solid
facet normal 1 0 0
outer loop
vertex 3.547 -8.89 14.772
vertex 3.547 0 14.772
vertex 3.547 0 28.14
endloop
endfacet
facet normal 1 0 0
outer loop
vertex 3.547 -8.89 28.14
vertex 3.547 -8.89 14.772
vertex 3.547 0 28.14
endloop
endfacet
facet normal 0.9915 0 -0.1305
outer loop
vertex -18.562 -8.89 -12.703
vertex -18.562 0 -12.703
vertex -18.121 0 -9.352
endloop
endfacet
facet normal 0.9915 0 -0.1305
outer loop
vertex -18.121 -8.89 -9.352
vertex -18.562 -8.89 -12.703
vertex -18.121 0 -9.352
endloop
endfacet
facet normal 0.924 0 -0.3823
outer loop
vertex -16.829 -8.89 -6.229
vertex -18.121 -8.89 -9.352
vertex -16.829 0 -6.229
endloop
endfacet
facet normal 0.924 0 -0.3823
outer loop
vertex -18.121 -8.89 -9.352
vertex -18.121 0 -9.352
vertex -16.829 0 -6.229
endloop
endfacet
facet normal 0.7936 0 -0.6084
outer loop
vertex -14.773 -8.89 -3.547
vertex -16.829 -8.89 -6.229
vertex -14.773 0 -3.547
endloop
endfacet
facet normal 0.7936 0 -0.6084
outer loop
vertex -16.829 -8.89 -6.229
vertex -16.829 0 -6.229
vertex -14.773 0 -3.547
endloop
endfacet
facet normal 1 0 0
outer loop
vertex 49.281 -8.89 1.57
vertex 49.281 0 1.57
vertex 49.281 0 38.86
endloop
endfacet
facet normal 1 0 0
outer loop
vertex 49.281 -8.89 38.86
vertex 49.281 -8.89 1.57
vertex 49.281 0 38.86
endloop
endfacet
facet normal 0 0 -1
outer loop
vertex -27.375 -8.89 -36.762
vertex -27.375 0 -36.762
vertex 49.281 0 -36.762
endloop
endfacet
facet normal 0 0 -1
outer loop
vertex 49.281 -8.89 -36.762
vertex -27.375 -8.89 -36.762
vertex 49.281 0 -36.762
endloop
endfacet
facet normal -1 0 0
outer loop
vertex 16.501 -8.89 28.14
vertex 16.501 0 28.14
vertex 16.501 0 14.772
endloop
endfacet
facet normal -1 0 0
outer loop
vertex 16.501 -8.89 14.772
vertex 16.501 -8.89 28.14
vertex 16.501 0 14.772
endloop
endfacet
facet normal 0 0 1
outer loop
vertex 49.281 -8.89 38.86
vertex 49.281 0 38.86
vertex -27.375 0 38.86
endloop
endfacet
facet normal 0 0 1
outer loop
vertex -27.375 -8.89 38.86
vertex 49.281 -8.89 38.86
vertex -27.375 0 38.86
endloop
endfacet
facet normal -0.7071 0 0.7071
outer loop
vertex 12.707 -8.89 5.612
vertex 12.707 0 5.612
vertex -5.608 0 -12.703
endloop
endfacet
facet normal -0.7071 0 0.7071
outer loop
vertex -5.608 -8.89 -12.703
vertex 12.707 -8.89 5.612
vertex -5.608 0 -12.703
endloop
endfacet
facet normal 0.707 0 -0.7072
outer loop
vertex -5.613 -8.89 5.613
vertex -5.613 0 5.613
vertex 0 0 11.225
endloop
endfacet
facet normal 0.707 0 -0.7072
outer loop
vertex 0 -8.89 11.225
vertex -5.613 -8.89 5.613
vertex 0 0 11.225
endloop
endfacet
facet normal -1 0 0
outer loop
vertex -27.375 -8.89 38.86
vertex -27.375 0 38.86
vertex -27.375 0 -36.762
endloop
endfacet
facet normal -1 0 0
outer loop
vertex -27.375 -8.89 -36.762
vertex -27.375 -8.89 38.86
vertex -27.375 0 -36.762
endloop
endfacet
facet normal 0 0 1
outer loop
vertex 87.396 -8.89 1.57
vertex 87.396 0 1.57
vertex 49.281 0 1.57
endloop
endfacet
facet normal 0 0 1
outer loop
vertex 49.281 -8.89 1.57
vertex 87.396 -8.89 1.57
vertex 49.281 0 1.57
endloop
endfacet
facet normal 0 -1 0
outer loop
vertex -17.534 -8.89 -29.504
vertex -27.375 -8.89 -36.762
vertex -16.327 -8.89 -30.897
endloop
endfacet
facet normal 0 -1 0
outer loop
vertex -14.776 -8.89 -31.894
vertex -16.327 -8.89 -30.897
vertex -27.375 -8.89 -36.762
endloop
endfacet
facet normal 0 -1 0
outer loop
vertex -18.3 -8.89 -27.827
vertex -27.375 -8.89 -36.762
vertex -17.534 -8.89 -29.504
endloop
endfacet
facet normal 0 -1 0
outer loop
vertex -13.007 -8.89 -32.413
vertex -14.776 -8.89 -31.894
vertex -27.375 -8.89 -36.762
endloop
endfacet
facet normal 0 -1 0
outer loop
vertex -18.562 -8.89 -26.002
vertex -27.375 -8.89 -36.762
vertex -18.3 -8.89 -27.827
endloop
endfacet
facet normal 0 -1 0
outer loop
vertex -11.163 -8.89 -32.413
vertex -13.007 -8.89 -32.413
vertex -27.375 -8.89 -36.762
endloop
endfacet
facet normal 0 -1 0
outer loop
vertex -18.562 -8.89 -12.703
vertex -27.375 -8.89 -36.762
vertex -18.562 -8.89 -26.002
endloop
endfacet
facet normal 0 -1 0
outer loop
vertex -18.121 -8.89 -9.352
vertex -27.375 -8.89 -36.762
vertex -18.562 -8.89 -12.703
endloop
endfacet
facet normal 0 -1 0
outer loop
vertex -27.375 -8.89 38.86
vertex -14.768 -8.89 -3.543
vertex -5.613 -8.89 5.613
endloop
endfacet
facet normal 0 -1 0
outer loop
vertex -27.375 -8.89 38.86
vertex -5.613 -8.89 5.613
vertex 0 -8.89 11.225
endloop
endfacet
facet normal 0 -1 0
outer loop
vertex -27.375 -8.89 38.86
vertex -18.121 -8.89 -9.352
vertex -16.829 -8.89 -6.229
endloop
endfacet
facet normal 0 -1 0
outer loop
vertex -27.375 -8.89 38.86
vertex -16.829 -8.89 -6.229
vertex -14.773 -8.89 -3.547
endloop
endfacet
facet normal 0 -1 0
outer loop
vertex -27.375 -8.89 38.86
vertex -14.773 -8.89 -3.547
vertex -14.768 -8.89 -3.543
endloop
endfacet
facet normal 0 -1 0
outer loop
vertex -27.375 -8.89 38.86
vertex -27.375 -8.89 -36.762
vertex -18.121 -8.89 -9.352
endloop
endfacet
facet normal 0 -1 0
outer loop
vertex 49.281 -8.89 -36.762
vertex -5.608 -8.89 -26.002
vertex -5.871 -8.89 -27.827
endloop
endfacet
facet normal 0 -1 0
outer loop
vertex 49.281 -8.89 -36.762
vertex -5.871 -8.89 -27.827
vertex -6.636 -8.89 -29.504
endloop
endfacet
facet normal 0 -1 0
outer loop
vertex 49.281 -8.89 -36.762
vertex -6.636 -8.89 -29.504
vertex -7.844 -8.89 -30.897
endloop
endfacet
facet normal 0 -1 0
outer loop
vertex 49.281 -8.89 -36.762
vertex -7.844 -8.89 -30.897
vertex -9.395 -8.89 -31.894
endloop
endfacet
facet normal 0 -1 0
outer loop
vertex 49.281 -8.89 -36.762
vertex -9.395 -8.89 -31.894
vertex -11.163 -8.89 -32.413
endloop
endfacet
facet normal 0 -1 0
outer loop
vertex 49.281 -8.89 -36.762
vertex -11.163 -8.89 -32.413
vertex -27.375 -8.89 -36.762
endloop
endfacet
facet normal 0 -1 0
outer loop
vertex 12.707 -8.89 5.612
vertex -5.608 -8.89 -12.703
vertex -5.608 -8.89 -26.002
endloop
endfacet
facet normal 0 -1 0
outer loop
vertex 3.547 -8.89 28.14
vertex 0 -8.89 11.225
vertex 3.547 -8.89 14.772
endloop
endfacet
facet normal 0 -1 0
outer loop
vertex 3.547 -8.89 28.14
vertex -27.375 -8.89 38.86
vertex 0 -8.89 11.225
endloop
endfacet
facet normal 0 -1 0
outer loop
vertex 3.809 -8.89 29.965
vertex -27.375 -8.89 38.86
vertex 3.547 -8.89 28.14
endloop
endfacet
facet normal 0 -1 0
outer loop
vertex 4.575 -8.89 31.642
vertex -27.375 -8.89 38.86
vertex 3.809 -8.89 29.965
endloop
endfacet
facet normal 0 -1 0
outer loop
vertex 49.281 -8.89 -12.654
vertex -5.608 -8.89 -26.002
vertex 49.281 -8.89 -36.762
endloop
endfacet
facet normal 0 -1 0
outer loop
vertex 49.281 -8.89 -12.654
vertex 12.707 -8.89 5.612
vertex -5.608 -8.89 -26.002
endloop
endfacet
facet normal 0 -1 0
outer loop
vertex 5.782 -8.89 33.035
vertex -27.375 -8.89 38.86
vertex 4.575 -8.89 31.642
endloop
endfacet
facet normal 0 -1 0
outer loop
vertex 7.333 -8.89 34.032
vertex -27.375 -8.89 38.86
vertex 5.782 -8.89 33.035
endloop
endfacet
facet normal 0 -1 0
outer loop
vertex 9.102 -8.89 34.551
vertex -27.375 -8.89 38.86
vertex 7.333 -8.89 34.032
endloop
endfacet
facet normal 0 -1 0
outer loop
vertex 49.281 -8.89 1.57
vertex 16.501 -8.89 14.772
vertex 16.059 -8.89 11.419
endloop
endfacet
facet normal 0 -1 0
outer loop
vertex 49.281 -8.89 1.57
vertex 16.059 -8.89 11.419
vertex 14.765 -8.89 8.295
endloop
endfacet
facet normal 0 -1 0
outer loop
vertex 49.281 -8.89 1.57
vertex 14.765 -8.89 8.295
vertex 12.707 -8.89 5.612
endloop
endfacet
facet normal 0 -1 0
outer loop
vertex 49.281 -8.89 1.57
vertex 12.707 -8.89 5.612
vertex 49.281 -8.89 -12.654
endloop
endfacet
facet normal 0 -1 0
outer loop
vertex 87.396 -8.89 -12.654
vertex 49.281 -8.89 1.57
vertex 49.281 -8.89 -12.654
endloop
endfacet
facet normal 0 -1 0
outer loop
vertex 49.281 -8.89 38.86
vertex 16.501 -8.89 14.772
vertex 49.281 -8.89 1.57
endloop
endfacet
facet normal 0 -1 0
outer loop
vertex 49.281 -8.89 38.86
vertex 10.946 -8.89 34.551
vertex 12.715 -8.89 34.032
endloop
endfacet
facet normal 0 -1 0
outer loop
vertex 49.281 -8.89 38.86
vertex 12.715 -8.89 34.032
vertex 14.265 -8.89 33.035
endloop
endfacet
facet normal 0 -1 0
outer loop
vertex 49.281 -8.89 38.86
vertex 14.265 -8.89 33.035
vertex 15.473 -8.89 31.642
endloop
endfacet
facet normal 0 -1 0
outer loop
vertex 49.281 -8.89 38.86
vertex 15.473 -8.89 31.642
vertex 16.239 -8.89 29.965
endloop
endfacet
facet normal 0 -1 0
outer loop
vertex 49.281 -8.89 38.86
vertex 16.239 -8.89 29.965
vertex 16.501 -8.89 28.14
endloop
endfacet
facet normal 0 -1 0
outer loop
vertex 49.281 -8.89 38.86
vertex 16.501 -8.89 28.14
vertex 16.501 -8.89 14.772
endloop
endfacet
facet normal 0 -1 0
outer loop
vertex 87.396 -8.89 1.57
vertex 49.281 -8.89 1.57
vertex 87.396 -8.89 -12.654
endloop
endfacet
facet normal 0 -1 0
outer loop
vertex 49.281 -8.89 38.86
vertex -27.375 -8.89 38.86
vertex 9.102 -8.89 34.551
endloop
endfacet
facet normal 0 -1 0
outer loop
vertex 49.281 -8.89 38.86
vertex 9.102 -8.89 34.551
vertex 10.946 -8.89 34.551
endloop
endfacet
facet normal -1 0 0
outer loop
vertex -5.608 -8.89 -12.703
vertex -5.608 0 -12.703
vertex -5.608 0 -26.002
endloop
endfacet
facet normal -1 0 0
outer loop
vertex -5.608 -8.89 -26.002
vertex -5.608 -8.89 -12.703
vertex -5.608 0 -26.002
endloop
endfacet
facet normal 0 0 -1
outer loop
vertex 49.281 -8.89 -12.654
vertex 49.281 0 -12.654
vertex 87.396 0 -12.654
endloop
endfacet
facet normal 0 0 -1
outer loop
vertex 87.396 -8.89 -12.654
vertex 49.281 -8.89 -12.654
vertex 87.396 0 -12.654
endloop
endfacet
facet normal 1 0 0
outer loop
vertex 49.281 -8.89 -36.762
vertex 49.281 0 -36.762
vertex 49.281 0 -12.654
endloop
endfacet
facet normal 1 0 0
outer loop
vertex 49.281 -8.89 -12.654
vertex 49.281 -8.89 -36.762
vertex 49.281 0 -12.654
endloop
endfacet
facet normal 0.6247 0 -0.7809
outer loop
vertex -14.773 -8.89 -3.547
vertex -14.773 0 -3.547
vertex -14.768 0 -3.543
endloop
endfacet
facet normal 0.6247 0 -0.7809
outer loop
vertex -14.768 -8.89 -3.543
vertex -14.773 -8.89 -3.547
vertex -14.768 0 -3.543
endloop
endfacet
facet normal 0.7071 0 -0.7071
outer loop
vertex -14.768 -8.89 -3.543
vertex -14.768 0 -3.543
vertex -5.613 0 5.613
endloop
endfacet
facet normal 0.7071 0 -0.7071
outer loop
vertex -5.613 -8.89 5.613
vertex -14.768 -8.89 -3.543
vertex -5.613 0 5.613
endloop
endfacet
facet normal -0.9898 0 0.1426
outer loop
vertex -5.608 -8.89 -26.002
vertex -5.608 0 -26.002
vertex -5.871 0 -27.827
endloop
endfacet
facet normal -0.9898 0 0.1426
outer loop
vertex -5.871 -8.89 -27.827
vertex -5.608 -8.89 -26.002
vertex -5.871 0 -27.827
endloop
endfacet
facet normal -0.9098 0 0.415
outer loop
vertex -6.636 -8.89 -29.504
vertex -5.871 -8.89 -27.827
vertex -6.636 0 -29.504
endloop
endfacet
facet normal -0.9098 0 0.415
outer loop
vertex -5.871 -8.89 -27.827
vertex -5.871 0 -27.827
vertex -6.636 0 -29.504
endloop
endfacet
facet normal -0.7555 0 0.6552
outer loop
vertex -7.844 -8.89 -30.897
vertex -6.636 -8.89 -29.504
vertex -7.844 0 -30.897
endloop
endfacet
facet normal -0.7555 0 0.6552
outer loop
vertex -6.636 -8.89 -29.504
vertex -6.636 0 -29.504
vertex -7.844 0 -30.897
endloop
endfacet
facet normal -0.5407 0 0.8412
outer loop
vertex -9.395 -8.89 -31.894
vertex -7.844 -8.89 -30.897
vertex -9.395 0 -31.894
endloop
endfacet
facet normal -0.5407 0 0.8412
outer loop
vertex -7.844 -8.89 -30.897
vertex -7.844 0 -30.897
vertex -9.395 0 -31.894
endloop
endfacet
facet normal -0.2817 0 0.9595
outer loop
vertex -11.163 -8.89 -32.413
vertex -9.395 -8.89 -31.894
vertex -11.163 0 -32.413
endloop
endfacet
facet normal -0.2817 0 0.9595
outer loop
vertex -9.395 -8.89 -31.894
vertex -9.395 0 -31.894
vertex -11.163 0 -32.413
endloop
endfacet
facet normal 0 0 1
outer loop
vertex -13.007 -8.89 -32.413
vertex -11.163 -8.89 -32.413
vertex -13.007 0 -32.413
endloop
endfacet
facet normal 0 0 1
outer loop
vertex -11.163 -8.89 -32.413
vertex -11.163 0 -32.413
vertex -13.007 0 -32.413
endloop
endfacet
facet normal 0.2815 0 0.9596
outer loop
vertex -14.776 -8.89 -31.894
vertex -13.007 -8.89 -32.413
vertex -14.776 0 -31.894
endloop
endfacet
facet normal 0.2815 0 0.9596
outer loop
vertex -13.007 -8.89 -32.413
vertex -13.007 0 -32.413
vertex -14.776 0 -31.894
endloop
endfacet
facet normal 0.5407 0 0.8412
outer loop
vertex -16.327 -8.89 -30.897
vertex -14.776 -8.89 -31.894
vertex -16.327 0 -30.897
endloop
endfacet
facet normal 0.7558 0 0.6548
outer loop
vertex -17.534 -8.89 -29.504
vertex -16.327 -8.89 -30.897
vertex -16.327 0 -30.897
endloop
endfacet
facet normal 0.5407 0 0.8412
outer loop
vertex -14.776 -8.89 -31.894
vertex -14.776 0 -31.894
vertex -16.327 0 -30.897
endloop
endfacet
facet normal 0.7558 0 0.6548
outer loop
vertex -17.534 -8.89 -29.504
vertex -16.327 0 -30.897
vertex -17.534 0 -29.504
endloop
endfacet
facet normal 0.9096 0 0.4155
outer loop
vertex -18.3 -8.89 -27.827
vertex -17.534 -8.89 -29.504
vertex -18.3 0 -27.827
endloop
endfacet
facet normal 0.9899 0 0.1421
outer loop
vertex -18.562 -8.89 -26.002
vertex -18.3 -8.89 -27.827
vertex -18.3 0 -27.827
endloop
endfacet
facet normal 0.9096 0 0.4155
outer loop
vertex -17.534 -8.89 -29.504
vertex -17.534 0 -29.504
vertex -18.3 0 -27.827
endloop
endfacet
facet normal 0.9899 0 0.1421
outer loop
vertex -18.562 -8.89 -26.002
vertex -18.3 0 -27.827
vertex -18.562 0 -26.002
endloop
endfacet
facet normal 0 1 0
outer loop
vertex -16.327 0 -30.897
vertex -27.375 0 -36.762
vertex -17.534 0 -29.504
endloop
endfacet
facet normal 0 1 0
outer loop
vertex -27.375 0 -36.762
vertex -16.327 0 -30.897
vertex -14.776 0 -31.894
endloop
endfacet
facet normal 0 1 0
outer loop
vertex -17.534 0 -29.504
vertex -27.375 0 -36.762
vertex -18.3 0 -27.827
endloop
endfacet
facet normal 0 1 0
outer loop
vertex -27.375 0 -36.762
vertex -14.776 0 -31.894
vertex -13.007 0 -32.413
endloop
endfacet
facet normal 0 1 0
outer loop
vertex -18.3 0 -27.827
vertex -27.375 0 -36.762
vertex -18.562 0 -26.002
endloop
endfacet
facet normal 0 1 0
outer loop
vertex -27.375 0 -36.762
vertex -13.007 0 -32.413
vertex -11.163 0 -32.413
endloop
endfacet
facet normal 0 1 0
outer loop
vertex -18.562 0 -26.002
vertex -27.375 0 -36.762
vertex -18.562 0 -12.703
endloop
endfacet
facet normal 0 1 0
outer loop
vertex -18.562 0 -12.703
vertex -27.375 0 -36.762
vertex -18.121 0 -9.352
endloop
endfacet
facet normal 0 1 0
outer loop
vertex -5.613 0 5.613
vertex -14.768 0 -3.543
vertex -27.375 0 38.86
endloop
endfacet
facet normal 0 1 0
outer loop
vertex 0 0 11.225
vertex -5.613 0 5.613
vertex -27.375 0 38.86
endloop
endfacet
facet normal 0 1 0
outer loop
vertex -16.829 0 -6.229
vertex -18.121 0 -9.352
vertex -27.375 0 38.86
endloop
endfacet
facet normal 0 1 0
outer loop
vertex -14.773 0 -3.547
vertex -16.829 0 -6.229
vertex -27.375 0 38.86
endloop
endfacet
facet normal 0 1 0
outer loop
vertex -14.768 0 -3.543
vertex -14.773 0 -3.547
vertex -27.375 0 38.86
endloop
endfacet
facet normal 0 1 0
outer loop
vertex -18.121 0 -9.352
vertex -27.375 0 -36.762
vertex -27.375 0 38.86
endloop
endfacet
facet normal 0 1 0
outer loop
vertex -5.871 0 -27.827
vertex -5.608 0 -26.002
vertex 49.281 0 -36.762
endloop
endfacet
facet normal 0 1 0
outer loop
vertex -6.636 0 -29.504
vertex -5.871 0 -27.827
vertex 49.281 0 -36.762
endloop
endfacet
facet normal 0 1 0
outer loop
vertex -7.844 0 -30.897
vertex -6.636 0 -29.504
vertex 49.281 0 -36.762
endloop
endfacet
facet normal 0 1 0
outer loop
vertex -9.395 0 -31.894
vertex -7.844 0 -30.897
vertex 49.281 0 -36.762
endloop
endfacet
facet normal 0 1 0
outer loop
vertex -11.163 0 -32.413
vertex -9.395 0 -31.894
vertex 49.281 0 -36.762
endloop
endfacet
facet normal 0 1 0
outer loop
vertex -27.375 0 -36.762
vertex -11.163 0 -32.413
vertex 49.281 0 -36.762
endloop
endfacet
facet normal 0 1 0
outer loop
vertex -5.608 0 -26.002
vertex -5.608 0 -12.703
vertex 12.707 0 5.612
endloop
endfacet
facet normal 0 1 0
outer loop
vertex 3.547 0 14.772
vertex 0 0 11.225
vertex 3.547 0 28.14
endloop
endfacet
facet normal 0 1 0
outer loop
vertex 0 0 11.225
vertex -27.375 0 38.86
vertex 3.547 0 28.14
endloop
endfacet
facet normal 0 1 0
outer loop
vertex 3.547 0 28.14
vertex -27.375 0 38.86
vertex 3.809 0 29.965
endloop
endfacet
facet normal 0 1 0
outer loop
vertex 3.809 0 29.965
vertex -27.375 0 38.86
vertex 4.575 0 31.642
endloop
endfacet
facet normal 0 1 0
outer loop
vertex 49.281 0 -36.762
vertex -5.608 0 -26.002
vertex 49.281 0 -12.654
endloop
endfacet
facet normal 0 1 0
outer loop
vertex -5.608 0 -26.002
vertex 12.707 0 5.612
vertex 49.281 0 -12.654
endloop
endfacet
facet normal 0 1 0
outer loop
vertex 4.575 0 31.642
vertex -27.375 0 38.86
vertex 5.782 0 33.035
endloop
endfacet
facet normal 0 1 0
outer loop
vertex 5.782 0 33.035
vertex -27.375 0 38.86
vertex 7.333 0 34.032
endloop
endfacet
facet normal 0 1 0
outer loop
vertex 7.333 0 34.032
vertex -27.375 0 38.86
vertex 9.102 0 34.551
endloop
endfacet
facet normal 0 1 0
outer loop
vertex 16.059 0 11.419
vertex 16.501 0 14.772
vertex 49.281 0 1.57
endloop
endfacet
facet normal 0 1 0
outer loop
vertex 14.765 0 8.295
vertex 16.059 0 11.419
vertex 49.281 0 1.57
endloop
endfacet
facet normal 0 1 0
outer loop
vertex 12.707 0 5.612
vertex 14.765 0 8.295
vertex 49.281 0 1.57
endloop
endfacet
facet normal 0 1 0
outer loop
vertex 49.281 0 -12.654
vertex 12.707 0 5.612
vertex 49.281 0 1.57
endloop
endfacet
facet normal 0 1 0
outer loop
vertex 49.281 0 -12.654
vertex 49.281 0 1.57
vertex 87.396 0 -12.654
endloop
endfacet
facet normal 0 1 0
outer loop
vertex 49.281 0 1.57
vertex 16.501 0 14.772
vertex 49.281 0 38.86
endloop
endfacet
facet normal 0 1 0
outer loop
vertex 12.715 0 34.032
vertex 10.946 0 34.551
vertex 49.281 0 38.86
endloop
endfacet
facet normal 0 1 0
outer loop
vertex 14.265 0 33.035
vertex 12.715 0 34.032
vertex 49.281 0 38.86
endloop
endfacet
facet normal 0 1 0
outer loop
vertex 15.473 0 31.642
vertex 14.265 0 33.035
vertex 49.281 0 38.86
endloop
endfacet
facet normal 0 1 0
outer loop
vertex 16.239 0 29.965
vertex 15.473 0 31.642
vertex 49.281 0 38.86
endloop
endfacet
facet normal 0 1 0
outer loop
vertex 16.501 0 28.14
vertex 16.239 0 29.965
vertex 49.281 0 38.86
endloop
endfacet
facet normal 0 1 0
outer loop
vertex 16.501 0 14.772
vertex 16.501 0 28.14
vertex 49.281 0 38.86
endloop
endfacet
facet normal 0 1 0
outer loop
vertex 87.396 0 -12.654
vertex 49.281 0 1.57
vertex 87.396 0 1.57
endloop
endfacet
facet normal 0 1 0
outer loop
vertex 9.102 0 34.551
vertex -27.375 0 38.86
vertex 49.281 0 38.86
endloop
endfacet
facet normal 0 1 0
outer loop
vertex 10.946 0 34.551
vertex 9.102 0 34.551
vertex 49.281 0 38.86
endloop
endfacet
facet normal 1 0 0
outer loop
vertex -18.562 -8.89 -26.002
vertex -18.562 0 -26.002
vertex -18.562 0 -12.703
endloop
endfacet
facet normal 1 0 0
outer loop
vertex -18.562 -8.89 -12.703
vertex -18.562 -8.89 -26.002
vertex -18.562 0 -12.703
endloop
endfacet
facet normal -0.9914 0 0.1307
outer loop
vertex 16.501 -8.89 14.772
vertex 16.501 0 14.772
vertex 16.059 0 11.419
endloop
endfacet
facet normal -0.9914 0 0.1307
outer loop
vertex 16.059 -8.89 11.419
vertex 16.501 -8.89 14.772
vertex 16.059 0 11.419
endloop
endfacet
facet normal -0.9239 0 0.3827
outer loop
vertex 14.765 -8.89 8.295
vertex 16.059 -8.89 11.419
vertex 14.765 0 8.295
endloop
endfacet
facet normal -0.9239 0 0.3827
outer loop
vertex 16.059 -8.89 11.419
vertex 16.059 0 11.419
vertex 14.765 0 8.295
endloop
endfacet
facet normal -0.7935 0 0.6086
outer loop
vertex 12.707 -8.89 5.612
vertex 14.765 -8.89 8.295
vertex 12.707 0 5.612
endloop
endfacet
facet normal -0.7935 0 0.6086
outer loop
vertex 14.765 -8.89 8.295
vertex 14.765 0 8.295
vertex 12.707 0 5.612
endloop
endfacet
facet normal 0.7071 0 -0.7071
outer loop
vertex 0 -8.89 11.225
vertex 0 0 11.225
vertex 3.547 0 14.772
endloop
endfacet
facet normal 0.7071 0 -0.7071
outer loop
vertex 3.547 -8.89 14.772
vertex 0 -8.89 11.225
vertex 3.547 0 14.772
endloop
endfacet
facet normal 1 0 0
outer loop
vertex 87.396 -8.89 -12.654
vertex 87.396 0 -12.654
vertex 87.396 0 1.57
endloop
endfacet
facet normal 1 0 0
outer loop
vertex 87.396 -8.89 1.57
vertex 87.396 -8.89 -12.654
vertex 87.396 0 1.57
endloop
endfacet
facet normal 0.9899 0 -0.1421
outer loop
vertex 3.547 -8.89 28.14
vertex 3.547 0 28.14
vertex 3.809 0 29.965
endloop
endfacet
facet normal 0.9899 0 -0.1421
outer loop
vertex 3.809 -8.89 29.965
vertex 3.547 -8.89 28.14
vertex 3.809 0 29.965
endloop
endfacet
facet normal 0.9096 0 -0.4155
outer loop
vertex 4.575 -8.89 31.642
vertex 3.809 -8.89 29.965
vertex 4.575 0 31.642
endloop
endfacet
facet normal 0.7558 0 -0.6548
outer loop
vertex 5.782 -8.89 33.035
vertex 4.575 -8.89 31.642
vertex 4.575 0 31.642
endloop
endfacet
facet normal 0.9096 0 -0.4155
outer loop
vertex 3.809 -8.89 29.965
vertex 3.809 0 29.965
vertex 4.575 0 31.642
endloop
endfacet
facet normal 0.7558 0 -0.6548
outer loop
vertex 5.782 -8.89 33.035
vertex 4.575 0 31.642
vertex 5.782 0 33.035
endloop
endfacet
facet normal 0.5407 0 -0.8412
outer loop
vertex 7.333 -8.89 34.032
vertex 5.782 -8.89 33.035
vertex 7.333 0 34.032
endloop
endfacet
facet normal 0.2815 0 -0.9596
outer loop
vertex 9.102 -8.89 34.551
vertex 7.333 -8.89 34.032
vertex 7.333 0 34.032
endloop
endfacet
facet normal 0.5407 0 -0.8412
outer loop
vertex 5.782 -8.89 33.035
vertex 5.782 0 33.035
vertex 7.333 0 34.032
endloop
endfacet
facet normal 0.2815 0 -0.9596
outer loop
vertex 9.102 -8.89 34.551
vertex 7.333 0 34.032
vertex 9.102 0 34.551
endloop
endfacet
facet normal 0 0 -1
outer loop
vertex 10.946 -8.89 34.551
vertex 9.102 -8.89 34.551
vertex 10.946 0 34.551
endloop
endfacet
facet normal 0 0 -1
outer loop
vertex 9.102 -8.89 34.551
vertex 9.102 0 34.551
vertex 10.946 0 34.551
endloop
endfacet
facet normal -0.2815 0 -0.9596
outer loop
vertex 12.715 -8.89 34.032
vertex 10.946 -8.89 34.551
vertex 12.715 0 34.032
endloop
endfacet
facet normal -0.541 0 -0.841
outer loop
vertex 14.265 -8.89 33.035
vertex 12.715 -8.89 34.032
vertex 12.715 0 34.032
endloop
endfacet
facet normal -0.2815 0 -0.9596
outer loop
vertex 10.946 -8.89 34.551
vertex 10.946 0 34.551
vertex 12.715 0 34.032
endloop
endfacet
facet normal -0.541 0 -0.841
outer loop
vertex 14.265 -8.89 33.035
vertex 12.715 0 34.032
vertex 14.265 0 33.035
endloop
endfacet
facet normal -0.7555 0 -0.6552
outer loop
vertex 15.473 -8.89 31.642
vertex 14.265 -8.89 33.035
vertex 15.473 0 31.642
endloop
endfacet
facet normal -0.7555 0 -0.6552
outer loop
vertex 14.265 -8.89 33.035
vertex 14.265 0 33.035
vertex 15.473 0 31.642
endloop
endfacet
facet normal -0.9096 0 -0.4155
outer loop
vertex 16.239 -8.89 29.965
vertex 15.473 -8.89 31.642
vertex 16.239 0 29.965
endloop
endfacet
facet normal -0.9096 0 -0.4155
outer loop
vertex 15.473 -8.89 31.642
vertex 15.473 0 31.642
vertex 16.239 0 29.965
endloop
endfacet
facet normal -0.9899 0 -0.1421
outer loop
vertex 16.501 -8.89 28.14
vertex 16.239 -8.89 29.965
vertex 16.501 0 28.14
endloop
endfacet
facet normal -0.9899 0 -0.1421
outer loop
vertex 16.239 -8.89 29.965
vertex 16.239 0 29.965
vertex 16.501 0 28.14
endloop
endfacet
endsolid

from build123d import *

# Parameters (mm, degrees)
F1_DEPTH = 8.89


# Not quite as in the source:
# - ends of sketch curves that miss each other by under 0.0002 mm in the source are joined


with BuildPart() as f1:
    # F0 (on Front) → F1 (new body)
    with BuildSketch(Plane.XZ):
        Polygon((49.2809079587, 38.859821856), (0, 38.859821856), (-27.3745507002, 38.859821856), (-27.3745507002, 1.9207646612), (-27.3745507002, -36.7616191506), (49.2809079587, -36.7616191506), (49.2809079587, -12.6536535591), (87.395709982, -12.6536535591), (87.395709982, -5.5416535591), (87.395709982, 1.5703464409), (49.2809079587, 1.5703464409), align=None)
        with BuildLine():
            Line((-5.6126600757, 5.6126600757), (0, 11.2253201513))
            Line((0, 11.2253201513), (3.5468912197, 14.7722113711))
            Line((3.5468912197, 14.7722113711), (3.5468912197, 28.1402313711))
            ThreePointArc((3.5468912197, 28.1402313711), (10.0238912197, 34.6172313711), (16.5008912197, 28.1402313711))
            Line((16.5008912197, 28.1402313711), (16.5008912197, 14.7722113711))
            ThreePointArc((16.5008912197, 14.7722113711), (15.5148266839, 9.8149301882), (12.7067524632, 5.6123501276))
            Line((12.7067524632, 5.6123501276), (3.5517127264, -3.5426896092))
            Line((3.5517127264, -3.5426896092), (-5.6081485171, -12.7025508527))
            Line((-5.6081485171, -12.7025508527), (-5.6081485171, -26.002401486))
            ThreePointArc((-5.6081485171, -26.002401486), (-12.085148378, -32.479401347), (-18.562148239, -26.002401486))
            Line((-18.562148239, -26.002401486), (-18.562148239, -12.7025505746))
            ThreePointArc((-18.562148239, -12.7025505746), (-17.5773042343, -7.7482170412), (-14.7725202074, -3.5472022785))
            Line((-14.7725202074, -3.5472022785), (-14.7680094825, -3.5426893311))
            Line((-14.7680094825, -3.5426893311), (-5.6129700238, 5.6123501276))
            Line((-5.6129700238, 5.6123501276), (-5.6126600757, 5.6126600757))
        make_face(mode=Mode.SUBTRACT)
    extrude(amount=F1_DEPTH)


solid = f1.part
